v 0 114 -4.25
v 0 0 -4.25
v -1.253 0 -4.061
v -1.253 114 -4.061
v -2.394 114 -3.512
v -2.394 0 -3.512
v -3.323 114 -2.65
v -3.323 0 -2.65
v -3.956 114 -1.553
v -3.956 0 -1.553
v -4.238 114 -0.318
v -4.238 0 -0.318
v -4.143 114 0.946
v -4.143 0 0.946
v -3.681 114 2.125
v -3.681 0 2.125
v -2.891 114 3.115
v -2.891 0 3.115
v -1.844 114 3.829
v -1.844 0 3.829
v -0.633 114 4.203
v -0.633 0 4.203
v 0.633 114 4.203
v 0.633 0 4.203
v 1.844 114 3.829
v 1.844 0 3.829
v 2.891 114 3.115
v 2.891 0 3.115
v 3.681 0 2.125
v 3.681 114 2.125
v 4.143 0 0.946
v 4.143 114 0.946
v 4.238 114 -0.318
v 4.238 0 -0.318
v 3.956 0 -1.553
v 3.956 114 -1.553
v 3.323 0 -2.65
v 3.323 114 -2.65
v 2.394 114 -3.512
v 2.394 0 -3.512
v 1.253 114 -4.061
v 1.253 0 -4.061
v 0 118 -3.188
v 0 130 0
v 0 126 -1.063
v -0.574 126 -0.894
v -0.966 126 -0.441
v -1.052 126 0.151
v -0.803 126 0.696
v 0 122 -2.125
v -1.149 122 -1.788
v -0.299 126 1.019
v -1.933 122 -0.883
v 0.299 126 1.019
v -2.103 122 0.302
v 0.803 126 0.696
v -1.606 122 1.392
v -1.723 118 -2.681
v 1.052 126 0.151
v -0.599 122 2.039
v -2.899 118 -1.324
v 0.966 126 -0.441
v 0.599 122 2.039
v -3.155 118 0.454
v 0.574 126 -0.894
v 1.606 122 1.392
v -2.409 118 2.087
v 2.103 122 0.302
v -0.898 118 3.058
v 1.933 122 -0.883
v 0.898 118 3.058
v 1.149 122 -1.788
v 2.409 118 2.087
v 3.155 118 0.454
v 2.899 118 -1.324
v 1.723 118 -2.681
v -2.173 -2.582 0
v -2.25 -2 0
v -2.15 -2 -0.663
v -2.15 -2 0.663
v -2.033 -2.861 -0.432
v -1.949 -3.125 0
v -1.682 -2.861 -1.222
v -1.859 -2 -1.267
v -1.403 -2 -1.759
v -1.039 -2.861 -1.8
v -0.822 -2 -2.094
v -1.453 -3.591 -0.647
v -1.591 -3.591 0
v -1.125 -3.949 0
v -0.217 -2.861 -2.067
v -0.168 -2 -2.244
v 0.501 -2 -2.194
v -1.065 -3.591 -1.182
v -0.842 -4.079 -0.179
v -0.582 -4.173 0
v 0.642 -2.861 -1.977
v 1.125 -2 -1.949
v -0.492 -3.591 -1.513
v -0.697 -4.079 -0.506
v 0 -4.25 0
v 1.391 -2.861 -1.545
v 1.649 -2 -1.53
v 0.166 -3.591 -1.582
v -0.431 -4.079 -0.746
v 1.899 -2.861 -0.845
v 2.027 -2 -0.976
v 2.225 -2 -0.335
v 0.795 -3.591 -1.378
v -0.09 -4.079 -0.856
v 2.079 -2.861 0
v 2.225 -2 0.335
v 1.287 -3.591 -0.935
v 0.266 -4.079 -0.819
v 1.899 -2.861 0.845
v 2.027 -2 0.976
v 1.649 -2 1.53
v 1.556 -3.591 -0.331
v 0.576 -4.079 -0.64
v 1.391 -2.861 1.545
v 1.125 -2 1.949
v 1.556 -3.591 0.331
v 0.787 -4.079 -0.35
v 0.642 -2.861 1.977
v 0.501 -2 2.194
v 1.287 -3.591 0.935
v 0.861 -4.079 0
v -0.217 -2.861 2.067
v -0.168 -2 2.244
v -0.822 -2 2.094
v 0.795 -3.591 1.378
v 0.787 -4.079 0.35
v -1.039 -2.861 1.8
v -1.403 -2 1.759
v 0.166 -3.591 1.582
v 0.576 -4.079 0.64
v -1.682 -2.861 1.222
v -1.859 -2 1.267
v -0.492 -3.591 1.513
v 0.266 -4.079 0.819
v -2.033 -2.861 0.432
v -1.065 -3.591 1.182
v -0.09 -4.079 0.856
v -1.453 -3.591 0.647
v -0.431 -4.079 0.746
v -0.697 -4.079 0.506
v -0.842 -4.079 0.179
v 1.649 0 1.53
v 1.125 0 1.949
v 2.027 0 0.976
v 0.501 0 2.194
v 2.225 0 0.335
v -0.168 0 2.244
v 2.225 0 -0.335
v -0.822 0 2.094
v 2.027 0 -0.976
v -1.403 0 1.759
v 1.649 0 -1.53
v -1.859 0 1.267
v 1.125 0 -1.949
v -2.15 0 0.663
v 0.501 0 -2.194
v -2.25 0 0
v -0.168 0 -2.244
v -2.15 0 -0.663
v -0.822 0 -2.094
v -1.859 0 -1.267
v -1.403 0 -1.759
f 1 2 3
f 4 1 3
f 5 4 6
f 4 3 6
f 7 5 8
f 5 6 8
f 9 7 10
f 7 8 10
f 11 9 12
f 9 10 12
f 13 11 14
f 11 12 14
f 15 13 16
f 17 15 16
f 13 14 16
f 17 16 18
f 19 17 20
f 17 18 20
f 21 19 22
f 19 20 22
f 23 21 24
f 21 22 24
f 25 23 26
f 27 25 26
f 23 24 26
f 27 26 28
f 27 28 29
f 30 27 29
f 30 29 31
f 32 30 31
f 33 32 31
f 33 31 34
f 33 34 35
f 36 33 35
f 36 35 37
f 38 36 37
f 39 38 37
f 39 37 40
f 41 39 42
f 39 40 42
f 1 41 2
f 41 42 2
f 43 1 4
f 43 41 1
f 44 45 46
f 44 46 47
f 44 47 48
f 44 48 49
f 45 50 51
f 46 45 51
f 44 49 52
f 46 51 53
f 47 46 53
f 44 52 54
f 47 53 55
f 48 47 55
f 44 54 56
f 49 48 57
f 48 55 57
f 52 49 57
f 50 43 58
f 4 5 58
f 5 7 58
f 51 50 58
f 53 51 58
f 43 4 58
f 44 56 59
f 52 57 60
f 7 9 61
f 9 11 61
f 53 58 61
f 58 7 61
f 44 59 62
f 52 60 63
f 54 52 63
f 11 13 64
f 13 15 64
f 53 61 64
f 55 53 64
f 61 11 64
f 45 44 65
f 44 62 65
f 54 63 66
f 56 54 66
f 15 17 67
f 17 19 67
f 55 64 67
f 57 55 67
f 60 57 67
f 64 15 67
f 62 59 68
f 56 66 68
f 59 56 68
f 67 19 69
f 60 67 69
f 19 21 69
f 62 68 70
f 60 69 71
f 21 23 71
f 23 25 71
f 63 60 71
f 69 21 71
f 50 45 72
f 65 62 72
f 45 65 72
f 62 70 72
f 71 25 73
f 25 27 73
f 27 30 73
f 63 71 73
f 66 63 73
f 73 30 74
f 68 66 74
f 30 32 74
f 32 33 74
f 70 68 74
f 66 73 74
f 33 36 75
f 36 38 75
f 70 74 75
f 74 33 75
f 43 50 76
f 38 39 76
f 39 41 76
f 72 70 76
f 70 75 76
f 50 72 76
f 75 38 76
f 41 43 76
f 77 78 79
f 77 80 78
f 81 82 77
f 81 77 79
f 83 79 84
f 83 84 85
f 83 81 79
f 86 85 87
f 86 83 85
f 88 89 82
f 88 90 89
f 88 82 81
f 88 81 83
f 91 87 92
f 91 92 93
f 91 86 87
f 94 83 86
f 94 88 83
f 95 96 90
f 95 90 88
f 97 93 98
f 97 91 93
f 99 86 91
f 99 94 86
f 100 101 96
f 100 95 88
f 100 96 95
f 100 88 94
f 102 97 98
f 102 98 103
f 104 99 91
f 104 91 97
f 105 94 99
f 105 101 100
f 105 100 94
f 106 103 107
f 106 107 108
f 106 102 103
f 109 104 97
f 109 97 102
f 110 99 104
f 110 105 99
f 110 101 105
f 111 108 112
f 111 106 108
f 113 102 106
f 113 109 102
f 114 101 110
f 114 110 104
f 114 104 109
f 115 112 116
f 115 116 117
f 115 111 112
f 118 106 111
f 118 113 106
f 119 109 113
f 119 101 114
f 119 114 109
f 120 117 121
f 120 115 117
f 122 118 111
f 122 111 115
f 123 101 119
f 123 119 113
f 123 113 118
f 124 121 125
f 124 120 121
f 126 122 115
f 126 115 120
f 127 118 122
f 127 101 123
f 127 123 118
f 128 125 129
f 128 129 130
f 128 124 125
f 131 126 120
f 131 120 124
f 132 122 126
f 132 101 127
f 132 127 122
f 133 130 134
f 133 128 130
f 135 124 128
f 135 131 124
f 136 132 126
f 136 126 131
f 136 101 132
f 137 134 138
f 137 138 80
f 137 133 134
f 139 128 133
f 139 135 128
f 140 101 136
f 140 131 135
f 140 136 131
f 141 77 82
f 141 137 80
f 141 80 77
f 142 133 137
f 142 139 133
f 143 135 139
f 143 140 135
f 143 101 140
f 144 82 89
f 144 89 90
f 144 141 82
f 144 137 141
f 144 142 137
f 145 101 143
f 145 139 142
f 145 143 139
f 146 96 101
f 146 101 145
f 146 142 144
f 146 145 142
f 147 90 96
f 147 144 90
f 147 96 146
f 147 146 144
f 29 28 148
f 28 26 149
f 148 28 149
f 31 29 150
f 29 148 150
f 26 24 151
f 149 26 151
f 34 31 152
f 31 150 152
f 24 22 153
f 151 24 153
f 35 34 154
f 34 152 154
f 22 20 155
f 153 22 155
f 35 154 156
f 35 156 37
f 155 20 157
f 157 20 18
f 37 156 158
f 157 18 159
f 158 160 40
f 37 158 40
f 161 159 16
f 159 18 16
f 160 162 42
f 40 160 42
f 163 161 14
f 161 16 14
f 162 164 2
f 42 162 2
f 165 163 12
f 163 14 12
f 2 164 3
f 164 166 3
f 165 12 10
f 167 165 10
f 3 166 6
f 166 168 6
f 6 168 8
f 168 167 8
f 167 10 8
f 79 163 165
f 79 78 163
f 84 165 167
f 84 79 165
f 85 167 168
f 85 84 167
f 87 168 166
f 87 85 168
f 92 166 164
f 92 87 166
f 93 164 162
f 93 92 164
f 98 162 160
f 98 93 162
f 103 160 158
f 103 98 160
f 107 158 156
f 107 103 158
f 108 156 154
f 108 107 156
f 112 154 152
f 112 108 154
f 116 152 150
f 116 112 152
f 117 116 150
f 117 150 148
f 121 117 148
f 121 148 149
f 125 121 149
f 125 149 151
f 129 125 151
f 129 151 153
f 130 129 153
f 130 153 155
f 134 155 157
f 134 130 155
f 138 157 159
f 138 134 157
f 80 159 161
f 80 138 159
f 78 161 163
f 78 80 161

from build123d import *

# Parameters (mm, degrees)
SKETCH1_R           = 4.25
BOSS_EXTRUDE1_DEPTH = 114


with BuildPart() as part:
    # Sketch1 → Boss-Extrude1 (new body)
    with BuildSketch(Plane(origin=(0, 0, 0), x_dir=(1, 0, 0), z_dir=(0, 1, 0))):
        with Locations(Location((0, 0, 0), (0, 0, 90))):
            Circle(SKETCH1_R)
    extrude(amount=BOSS_EXTRUDE1_DEPTH)

    # Sketch2 → Revolve1 (revolve)
    with BuildSketch(Plane.XY, mode=Mode.PRIVATE) as revolve1_sk:
        with BuildLine():
            Line((2.25, 0), (2.25, -2))
            ThreePointArc((2.25, -2), (1.590990258, -3.590990258), (0, -4.25))
            Line((0, -4.25), (0, 0))
            Line((0, 0), (2.25, 0))
        make_face()
    revolve(revolve1_sk.sketch.rotate(Axis((0, 0, 0), (0, -1, 0)), 180), axis=Axis((0, 0, 0), (0, -1, 0)))

    # Sketch3 → Revolve2 (revolve)
    with BuildSketch(Plane.XY, mode=Mode.PRIVATE) as revolve2_sk:
        Polygon((0, 114), (0, 130), (4.25, 114), align=None)
    revolve(revolve2_sk.sketch.rotate(Axis((0, 114, 0), (0, 1, 0)), 90), axis=Axis((0, 114, 0), (0, 1, 0)))


solid = part.part
